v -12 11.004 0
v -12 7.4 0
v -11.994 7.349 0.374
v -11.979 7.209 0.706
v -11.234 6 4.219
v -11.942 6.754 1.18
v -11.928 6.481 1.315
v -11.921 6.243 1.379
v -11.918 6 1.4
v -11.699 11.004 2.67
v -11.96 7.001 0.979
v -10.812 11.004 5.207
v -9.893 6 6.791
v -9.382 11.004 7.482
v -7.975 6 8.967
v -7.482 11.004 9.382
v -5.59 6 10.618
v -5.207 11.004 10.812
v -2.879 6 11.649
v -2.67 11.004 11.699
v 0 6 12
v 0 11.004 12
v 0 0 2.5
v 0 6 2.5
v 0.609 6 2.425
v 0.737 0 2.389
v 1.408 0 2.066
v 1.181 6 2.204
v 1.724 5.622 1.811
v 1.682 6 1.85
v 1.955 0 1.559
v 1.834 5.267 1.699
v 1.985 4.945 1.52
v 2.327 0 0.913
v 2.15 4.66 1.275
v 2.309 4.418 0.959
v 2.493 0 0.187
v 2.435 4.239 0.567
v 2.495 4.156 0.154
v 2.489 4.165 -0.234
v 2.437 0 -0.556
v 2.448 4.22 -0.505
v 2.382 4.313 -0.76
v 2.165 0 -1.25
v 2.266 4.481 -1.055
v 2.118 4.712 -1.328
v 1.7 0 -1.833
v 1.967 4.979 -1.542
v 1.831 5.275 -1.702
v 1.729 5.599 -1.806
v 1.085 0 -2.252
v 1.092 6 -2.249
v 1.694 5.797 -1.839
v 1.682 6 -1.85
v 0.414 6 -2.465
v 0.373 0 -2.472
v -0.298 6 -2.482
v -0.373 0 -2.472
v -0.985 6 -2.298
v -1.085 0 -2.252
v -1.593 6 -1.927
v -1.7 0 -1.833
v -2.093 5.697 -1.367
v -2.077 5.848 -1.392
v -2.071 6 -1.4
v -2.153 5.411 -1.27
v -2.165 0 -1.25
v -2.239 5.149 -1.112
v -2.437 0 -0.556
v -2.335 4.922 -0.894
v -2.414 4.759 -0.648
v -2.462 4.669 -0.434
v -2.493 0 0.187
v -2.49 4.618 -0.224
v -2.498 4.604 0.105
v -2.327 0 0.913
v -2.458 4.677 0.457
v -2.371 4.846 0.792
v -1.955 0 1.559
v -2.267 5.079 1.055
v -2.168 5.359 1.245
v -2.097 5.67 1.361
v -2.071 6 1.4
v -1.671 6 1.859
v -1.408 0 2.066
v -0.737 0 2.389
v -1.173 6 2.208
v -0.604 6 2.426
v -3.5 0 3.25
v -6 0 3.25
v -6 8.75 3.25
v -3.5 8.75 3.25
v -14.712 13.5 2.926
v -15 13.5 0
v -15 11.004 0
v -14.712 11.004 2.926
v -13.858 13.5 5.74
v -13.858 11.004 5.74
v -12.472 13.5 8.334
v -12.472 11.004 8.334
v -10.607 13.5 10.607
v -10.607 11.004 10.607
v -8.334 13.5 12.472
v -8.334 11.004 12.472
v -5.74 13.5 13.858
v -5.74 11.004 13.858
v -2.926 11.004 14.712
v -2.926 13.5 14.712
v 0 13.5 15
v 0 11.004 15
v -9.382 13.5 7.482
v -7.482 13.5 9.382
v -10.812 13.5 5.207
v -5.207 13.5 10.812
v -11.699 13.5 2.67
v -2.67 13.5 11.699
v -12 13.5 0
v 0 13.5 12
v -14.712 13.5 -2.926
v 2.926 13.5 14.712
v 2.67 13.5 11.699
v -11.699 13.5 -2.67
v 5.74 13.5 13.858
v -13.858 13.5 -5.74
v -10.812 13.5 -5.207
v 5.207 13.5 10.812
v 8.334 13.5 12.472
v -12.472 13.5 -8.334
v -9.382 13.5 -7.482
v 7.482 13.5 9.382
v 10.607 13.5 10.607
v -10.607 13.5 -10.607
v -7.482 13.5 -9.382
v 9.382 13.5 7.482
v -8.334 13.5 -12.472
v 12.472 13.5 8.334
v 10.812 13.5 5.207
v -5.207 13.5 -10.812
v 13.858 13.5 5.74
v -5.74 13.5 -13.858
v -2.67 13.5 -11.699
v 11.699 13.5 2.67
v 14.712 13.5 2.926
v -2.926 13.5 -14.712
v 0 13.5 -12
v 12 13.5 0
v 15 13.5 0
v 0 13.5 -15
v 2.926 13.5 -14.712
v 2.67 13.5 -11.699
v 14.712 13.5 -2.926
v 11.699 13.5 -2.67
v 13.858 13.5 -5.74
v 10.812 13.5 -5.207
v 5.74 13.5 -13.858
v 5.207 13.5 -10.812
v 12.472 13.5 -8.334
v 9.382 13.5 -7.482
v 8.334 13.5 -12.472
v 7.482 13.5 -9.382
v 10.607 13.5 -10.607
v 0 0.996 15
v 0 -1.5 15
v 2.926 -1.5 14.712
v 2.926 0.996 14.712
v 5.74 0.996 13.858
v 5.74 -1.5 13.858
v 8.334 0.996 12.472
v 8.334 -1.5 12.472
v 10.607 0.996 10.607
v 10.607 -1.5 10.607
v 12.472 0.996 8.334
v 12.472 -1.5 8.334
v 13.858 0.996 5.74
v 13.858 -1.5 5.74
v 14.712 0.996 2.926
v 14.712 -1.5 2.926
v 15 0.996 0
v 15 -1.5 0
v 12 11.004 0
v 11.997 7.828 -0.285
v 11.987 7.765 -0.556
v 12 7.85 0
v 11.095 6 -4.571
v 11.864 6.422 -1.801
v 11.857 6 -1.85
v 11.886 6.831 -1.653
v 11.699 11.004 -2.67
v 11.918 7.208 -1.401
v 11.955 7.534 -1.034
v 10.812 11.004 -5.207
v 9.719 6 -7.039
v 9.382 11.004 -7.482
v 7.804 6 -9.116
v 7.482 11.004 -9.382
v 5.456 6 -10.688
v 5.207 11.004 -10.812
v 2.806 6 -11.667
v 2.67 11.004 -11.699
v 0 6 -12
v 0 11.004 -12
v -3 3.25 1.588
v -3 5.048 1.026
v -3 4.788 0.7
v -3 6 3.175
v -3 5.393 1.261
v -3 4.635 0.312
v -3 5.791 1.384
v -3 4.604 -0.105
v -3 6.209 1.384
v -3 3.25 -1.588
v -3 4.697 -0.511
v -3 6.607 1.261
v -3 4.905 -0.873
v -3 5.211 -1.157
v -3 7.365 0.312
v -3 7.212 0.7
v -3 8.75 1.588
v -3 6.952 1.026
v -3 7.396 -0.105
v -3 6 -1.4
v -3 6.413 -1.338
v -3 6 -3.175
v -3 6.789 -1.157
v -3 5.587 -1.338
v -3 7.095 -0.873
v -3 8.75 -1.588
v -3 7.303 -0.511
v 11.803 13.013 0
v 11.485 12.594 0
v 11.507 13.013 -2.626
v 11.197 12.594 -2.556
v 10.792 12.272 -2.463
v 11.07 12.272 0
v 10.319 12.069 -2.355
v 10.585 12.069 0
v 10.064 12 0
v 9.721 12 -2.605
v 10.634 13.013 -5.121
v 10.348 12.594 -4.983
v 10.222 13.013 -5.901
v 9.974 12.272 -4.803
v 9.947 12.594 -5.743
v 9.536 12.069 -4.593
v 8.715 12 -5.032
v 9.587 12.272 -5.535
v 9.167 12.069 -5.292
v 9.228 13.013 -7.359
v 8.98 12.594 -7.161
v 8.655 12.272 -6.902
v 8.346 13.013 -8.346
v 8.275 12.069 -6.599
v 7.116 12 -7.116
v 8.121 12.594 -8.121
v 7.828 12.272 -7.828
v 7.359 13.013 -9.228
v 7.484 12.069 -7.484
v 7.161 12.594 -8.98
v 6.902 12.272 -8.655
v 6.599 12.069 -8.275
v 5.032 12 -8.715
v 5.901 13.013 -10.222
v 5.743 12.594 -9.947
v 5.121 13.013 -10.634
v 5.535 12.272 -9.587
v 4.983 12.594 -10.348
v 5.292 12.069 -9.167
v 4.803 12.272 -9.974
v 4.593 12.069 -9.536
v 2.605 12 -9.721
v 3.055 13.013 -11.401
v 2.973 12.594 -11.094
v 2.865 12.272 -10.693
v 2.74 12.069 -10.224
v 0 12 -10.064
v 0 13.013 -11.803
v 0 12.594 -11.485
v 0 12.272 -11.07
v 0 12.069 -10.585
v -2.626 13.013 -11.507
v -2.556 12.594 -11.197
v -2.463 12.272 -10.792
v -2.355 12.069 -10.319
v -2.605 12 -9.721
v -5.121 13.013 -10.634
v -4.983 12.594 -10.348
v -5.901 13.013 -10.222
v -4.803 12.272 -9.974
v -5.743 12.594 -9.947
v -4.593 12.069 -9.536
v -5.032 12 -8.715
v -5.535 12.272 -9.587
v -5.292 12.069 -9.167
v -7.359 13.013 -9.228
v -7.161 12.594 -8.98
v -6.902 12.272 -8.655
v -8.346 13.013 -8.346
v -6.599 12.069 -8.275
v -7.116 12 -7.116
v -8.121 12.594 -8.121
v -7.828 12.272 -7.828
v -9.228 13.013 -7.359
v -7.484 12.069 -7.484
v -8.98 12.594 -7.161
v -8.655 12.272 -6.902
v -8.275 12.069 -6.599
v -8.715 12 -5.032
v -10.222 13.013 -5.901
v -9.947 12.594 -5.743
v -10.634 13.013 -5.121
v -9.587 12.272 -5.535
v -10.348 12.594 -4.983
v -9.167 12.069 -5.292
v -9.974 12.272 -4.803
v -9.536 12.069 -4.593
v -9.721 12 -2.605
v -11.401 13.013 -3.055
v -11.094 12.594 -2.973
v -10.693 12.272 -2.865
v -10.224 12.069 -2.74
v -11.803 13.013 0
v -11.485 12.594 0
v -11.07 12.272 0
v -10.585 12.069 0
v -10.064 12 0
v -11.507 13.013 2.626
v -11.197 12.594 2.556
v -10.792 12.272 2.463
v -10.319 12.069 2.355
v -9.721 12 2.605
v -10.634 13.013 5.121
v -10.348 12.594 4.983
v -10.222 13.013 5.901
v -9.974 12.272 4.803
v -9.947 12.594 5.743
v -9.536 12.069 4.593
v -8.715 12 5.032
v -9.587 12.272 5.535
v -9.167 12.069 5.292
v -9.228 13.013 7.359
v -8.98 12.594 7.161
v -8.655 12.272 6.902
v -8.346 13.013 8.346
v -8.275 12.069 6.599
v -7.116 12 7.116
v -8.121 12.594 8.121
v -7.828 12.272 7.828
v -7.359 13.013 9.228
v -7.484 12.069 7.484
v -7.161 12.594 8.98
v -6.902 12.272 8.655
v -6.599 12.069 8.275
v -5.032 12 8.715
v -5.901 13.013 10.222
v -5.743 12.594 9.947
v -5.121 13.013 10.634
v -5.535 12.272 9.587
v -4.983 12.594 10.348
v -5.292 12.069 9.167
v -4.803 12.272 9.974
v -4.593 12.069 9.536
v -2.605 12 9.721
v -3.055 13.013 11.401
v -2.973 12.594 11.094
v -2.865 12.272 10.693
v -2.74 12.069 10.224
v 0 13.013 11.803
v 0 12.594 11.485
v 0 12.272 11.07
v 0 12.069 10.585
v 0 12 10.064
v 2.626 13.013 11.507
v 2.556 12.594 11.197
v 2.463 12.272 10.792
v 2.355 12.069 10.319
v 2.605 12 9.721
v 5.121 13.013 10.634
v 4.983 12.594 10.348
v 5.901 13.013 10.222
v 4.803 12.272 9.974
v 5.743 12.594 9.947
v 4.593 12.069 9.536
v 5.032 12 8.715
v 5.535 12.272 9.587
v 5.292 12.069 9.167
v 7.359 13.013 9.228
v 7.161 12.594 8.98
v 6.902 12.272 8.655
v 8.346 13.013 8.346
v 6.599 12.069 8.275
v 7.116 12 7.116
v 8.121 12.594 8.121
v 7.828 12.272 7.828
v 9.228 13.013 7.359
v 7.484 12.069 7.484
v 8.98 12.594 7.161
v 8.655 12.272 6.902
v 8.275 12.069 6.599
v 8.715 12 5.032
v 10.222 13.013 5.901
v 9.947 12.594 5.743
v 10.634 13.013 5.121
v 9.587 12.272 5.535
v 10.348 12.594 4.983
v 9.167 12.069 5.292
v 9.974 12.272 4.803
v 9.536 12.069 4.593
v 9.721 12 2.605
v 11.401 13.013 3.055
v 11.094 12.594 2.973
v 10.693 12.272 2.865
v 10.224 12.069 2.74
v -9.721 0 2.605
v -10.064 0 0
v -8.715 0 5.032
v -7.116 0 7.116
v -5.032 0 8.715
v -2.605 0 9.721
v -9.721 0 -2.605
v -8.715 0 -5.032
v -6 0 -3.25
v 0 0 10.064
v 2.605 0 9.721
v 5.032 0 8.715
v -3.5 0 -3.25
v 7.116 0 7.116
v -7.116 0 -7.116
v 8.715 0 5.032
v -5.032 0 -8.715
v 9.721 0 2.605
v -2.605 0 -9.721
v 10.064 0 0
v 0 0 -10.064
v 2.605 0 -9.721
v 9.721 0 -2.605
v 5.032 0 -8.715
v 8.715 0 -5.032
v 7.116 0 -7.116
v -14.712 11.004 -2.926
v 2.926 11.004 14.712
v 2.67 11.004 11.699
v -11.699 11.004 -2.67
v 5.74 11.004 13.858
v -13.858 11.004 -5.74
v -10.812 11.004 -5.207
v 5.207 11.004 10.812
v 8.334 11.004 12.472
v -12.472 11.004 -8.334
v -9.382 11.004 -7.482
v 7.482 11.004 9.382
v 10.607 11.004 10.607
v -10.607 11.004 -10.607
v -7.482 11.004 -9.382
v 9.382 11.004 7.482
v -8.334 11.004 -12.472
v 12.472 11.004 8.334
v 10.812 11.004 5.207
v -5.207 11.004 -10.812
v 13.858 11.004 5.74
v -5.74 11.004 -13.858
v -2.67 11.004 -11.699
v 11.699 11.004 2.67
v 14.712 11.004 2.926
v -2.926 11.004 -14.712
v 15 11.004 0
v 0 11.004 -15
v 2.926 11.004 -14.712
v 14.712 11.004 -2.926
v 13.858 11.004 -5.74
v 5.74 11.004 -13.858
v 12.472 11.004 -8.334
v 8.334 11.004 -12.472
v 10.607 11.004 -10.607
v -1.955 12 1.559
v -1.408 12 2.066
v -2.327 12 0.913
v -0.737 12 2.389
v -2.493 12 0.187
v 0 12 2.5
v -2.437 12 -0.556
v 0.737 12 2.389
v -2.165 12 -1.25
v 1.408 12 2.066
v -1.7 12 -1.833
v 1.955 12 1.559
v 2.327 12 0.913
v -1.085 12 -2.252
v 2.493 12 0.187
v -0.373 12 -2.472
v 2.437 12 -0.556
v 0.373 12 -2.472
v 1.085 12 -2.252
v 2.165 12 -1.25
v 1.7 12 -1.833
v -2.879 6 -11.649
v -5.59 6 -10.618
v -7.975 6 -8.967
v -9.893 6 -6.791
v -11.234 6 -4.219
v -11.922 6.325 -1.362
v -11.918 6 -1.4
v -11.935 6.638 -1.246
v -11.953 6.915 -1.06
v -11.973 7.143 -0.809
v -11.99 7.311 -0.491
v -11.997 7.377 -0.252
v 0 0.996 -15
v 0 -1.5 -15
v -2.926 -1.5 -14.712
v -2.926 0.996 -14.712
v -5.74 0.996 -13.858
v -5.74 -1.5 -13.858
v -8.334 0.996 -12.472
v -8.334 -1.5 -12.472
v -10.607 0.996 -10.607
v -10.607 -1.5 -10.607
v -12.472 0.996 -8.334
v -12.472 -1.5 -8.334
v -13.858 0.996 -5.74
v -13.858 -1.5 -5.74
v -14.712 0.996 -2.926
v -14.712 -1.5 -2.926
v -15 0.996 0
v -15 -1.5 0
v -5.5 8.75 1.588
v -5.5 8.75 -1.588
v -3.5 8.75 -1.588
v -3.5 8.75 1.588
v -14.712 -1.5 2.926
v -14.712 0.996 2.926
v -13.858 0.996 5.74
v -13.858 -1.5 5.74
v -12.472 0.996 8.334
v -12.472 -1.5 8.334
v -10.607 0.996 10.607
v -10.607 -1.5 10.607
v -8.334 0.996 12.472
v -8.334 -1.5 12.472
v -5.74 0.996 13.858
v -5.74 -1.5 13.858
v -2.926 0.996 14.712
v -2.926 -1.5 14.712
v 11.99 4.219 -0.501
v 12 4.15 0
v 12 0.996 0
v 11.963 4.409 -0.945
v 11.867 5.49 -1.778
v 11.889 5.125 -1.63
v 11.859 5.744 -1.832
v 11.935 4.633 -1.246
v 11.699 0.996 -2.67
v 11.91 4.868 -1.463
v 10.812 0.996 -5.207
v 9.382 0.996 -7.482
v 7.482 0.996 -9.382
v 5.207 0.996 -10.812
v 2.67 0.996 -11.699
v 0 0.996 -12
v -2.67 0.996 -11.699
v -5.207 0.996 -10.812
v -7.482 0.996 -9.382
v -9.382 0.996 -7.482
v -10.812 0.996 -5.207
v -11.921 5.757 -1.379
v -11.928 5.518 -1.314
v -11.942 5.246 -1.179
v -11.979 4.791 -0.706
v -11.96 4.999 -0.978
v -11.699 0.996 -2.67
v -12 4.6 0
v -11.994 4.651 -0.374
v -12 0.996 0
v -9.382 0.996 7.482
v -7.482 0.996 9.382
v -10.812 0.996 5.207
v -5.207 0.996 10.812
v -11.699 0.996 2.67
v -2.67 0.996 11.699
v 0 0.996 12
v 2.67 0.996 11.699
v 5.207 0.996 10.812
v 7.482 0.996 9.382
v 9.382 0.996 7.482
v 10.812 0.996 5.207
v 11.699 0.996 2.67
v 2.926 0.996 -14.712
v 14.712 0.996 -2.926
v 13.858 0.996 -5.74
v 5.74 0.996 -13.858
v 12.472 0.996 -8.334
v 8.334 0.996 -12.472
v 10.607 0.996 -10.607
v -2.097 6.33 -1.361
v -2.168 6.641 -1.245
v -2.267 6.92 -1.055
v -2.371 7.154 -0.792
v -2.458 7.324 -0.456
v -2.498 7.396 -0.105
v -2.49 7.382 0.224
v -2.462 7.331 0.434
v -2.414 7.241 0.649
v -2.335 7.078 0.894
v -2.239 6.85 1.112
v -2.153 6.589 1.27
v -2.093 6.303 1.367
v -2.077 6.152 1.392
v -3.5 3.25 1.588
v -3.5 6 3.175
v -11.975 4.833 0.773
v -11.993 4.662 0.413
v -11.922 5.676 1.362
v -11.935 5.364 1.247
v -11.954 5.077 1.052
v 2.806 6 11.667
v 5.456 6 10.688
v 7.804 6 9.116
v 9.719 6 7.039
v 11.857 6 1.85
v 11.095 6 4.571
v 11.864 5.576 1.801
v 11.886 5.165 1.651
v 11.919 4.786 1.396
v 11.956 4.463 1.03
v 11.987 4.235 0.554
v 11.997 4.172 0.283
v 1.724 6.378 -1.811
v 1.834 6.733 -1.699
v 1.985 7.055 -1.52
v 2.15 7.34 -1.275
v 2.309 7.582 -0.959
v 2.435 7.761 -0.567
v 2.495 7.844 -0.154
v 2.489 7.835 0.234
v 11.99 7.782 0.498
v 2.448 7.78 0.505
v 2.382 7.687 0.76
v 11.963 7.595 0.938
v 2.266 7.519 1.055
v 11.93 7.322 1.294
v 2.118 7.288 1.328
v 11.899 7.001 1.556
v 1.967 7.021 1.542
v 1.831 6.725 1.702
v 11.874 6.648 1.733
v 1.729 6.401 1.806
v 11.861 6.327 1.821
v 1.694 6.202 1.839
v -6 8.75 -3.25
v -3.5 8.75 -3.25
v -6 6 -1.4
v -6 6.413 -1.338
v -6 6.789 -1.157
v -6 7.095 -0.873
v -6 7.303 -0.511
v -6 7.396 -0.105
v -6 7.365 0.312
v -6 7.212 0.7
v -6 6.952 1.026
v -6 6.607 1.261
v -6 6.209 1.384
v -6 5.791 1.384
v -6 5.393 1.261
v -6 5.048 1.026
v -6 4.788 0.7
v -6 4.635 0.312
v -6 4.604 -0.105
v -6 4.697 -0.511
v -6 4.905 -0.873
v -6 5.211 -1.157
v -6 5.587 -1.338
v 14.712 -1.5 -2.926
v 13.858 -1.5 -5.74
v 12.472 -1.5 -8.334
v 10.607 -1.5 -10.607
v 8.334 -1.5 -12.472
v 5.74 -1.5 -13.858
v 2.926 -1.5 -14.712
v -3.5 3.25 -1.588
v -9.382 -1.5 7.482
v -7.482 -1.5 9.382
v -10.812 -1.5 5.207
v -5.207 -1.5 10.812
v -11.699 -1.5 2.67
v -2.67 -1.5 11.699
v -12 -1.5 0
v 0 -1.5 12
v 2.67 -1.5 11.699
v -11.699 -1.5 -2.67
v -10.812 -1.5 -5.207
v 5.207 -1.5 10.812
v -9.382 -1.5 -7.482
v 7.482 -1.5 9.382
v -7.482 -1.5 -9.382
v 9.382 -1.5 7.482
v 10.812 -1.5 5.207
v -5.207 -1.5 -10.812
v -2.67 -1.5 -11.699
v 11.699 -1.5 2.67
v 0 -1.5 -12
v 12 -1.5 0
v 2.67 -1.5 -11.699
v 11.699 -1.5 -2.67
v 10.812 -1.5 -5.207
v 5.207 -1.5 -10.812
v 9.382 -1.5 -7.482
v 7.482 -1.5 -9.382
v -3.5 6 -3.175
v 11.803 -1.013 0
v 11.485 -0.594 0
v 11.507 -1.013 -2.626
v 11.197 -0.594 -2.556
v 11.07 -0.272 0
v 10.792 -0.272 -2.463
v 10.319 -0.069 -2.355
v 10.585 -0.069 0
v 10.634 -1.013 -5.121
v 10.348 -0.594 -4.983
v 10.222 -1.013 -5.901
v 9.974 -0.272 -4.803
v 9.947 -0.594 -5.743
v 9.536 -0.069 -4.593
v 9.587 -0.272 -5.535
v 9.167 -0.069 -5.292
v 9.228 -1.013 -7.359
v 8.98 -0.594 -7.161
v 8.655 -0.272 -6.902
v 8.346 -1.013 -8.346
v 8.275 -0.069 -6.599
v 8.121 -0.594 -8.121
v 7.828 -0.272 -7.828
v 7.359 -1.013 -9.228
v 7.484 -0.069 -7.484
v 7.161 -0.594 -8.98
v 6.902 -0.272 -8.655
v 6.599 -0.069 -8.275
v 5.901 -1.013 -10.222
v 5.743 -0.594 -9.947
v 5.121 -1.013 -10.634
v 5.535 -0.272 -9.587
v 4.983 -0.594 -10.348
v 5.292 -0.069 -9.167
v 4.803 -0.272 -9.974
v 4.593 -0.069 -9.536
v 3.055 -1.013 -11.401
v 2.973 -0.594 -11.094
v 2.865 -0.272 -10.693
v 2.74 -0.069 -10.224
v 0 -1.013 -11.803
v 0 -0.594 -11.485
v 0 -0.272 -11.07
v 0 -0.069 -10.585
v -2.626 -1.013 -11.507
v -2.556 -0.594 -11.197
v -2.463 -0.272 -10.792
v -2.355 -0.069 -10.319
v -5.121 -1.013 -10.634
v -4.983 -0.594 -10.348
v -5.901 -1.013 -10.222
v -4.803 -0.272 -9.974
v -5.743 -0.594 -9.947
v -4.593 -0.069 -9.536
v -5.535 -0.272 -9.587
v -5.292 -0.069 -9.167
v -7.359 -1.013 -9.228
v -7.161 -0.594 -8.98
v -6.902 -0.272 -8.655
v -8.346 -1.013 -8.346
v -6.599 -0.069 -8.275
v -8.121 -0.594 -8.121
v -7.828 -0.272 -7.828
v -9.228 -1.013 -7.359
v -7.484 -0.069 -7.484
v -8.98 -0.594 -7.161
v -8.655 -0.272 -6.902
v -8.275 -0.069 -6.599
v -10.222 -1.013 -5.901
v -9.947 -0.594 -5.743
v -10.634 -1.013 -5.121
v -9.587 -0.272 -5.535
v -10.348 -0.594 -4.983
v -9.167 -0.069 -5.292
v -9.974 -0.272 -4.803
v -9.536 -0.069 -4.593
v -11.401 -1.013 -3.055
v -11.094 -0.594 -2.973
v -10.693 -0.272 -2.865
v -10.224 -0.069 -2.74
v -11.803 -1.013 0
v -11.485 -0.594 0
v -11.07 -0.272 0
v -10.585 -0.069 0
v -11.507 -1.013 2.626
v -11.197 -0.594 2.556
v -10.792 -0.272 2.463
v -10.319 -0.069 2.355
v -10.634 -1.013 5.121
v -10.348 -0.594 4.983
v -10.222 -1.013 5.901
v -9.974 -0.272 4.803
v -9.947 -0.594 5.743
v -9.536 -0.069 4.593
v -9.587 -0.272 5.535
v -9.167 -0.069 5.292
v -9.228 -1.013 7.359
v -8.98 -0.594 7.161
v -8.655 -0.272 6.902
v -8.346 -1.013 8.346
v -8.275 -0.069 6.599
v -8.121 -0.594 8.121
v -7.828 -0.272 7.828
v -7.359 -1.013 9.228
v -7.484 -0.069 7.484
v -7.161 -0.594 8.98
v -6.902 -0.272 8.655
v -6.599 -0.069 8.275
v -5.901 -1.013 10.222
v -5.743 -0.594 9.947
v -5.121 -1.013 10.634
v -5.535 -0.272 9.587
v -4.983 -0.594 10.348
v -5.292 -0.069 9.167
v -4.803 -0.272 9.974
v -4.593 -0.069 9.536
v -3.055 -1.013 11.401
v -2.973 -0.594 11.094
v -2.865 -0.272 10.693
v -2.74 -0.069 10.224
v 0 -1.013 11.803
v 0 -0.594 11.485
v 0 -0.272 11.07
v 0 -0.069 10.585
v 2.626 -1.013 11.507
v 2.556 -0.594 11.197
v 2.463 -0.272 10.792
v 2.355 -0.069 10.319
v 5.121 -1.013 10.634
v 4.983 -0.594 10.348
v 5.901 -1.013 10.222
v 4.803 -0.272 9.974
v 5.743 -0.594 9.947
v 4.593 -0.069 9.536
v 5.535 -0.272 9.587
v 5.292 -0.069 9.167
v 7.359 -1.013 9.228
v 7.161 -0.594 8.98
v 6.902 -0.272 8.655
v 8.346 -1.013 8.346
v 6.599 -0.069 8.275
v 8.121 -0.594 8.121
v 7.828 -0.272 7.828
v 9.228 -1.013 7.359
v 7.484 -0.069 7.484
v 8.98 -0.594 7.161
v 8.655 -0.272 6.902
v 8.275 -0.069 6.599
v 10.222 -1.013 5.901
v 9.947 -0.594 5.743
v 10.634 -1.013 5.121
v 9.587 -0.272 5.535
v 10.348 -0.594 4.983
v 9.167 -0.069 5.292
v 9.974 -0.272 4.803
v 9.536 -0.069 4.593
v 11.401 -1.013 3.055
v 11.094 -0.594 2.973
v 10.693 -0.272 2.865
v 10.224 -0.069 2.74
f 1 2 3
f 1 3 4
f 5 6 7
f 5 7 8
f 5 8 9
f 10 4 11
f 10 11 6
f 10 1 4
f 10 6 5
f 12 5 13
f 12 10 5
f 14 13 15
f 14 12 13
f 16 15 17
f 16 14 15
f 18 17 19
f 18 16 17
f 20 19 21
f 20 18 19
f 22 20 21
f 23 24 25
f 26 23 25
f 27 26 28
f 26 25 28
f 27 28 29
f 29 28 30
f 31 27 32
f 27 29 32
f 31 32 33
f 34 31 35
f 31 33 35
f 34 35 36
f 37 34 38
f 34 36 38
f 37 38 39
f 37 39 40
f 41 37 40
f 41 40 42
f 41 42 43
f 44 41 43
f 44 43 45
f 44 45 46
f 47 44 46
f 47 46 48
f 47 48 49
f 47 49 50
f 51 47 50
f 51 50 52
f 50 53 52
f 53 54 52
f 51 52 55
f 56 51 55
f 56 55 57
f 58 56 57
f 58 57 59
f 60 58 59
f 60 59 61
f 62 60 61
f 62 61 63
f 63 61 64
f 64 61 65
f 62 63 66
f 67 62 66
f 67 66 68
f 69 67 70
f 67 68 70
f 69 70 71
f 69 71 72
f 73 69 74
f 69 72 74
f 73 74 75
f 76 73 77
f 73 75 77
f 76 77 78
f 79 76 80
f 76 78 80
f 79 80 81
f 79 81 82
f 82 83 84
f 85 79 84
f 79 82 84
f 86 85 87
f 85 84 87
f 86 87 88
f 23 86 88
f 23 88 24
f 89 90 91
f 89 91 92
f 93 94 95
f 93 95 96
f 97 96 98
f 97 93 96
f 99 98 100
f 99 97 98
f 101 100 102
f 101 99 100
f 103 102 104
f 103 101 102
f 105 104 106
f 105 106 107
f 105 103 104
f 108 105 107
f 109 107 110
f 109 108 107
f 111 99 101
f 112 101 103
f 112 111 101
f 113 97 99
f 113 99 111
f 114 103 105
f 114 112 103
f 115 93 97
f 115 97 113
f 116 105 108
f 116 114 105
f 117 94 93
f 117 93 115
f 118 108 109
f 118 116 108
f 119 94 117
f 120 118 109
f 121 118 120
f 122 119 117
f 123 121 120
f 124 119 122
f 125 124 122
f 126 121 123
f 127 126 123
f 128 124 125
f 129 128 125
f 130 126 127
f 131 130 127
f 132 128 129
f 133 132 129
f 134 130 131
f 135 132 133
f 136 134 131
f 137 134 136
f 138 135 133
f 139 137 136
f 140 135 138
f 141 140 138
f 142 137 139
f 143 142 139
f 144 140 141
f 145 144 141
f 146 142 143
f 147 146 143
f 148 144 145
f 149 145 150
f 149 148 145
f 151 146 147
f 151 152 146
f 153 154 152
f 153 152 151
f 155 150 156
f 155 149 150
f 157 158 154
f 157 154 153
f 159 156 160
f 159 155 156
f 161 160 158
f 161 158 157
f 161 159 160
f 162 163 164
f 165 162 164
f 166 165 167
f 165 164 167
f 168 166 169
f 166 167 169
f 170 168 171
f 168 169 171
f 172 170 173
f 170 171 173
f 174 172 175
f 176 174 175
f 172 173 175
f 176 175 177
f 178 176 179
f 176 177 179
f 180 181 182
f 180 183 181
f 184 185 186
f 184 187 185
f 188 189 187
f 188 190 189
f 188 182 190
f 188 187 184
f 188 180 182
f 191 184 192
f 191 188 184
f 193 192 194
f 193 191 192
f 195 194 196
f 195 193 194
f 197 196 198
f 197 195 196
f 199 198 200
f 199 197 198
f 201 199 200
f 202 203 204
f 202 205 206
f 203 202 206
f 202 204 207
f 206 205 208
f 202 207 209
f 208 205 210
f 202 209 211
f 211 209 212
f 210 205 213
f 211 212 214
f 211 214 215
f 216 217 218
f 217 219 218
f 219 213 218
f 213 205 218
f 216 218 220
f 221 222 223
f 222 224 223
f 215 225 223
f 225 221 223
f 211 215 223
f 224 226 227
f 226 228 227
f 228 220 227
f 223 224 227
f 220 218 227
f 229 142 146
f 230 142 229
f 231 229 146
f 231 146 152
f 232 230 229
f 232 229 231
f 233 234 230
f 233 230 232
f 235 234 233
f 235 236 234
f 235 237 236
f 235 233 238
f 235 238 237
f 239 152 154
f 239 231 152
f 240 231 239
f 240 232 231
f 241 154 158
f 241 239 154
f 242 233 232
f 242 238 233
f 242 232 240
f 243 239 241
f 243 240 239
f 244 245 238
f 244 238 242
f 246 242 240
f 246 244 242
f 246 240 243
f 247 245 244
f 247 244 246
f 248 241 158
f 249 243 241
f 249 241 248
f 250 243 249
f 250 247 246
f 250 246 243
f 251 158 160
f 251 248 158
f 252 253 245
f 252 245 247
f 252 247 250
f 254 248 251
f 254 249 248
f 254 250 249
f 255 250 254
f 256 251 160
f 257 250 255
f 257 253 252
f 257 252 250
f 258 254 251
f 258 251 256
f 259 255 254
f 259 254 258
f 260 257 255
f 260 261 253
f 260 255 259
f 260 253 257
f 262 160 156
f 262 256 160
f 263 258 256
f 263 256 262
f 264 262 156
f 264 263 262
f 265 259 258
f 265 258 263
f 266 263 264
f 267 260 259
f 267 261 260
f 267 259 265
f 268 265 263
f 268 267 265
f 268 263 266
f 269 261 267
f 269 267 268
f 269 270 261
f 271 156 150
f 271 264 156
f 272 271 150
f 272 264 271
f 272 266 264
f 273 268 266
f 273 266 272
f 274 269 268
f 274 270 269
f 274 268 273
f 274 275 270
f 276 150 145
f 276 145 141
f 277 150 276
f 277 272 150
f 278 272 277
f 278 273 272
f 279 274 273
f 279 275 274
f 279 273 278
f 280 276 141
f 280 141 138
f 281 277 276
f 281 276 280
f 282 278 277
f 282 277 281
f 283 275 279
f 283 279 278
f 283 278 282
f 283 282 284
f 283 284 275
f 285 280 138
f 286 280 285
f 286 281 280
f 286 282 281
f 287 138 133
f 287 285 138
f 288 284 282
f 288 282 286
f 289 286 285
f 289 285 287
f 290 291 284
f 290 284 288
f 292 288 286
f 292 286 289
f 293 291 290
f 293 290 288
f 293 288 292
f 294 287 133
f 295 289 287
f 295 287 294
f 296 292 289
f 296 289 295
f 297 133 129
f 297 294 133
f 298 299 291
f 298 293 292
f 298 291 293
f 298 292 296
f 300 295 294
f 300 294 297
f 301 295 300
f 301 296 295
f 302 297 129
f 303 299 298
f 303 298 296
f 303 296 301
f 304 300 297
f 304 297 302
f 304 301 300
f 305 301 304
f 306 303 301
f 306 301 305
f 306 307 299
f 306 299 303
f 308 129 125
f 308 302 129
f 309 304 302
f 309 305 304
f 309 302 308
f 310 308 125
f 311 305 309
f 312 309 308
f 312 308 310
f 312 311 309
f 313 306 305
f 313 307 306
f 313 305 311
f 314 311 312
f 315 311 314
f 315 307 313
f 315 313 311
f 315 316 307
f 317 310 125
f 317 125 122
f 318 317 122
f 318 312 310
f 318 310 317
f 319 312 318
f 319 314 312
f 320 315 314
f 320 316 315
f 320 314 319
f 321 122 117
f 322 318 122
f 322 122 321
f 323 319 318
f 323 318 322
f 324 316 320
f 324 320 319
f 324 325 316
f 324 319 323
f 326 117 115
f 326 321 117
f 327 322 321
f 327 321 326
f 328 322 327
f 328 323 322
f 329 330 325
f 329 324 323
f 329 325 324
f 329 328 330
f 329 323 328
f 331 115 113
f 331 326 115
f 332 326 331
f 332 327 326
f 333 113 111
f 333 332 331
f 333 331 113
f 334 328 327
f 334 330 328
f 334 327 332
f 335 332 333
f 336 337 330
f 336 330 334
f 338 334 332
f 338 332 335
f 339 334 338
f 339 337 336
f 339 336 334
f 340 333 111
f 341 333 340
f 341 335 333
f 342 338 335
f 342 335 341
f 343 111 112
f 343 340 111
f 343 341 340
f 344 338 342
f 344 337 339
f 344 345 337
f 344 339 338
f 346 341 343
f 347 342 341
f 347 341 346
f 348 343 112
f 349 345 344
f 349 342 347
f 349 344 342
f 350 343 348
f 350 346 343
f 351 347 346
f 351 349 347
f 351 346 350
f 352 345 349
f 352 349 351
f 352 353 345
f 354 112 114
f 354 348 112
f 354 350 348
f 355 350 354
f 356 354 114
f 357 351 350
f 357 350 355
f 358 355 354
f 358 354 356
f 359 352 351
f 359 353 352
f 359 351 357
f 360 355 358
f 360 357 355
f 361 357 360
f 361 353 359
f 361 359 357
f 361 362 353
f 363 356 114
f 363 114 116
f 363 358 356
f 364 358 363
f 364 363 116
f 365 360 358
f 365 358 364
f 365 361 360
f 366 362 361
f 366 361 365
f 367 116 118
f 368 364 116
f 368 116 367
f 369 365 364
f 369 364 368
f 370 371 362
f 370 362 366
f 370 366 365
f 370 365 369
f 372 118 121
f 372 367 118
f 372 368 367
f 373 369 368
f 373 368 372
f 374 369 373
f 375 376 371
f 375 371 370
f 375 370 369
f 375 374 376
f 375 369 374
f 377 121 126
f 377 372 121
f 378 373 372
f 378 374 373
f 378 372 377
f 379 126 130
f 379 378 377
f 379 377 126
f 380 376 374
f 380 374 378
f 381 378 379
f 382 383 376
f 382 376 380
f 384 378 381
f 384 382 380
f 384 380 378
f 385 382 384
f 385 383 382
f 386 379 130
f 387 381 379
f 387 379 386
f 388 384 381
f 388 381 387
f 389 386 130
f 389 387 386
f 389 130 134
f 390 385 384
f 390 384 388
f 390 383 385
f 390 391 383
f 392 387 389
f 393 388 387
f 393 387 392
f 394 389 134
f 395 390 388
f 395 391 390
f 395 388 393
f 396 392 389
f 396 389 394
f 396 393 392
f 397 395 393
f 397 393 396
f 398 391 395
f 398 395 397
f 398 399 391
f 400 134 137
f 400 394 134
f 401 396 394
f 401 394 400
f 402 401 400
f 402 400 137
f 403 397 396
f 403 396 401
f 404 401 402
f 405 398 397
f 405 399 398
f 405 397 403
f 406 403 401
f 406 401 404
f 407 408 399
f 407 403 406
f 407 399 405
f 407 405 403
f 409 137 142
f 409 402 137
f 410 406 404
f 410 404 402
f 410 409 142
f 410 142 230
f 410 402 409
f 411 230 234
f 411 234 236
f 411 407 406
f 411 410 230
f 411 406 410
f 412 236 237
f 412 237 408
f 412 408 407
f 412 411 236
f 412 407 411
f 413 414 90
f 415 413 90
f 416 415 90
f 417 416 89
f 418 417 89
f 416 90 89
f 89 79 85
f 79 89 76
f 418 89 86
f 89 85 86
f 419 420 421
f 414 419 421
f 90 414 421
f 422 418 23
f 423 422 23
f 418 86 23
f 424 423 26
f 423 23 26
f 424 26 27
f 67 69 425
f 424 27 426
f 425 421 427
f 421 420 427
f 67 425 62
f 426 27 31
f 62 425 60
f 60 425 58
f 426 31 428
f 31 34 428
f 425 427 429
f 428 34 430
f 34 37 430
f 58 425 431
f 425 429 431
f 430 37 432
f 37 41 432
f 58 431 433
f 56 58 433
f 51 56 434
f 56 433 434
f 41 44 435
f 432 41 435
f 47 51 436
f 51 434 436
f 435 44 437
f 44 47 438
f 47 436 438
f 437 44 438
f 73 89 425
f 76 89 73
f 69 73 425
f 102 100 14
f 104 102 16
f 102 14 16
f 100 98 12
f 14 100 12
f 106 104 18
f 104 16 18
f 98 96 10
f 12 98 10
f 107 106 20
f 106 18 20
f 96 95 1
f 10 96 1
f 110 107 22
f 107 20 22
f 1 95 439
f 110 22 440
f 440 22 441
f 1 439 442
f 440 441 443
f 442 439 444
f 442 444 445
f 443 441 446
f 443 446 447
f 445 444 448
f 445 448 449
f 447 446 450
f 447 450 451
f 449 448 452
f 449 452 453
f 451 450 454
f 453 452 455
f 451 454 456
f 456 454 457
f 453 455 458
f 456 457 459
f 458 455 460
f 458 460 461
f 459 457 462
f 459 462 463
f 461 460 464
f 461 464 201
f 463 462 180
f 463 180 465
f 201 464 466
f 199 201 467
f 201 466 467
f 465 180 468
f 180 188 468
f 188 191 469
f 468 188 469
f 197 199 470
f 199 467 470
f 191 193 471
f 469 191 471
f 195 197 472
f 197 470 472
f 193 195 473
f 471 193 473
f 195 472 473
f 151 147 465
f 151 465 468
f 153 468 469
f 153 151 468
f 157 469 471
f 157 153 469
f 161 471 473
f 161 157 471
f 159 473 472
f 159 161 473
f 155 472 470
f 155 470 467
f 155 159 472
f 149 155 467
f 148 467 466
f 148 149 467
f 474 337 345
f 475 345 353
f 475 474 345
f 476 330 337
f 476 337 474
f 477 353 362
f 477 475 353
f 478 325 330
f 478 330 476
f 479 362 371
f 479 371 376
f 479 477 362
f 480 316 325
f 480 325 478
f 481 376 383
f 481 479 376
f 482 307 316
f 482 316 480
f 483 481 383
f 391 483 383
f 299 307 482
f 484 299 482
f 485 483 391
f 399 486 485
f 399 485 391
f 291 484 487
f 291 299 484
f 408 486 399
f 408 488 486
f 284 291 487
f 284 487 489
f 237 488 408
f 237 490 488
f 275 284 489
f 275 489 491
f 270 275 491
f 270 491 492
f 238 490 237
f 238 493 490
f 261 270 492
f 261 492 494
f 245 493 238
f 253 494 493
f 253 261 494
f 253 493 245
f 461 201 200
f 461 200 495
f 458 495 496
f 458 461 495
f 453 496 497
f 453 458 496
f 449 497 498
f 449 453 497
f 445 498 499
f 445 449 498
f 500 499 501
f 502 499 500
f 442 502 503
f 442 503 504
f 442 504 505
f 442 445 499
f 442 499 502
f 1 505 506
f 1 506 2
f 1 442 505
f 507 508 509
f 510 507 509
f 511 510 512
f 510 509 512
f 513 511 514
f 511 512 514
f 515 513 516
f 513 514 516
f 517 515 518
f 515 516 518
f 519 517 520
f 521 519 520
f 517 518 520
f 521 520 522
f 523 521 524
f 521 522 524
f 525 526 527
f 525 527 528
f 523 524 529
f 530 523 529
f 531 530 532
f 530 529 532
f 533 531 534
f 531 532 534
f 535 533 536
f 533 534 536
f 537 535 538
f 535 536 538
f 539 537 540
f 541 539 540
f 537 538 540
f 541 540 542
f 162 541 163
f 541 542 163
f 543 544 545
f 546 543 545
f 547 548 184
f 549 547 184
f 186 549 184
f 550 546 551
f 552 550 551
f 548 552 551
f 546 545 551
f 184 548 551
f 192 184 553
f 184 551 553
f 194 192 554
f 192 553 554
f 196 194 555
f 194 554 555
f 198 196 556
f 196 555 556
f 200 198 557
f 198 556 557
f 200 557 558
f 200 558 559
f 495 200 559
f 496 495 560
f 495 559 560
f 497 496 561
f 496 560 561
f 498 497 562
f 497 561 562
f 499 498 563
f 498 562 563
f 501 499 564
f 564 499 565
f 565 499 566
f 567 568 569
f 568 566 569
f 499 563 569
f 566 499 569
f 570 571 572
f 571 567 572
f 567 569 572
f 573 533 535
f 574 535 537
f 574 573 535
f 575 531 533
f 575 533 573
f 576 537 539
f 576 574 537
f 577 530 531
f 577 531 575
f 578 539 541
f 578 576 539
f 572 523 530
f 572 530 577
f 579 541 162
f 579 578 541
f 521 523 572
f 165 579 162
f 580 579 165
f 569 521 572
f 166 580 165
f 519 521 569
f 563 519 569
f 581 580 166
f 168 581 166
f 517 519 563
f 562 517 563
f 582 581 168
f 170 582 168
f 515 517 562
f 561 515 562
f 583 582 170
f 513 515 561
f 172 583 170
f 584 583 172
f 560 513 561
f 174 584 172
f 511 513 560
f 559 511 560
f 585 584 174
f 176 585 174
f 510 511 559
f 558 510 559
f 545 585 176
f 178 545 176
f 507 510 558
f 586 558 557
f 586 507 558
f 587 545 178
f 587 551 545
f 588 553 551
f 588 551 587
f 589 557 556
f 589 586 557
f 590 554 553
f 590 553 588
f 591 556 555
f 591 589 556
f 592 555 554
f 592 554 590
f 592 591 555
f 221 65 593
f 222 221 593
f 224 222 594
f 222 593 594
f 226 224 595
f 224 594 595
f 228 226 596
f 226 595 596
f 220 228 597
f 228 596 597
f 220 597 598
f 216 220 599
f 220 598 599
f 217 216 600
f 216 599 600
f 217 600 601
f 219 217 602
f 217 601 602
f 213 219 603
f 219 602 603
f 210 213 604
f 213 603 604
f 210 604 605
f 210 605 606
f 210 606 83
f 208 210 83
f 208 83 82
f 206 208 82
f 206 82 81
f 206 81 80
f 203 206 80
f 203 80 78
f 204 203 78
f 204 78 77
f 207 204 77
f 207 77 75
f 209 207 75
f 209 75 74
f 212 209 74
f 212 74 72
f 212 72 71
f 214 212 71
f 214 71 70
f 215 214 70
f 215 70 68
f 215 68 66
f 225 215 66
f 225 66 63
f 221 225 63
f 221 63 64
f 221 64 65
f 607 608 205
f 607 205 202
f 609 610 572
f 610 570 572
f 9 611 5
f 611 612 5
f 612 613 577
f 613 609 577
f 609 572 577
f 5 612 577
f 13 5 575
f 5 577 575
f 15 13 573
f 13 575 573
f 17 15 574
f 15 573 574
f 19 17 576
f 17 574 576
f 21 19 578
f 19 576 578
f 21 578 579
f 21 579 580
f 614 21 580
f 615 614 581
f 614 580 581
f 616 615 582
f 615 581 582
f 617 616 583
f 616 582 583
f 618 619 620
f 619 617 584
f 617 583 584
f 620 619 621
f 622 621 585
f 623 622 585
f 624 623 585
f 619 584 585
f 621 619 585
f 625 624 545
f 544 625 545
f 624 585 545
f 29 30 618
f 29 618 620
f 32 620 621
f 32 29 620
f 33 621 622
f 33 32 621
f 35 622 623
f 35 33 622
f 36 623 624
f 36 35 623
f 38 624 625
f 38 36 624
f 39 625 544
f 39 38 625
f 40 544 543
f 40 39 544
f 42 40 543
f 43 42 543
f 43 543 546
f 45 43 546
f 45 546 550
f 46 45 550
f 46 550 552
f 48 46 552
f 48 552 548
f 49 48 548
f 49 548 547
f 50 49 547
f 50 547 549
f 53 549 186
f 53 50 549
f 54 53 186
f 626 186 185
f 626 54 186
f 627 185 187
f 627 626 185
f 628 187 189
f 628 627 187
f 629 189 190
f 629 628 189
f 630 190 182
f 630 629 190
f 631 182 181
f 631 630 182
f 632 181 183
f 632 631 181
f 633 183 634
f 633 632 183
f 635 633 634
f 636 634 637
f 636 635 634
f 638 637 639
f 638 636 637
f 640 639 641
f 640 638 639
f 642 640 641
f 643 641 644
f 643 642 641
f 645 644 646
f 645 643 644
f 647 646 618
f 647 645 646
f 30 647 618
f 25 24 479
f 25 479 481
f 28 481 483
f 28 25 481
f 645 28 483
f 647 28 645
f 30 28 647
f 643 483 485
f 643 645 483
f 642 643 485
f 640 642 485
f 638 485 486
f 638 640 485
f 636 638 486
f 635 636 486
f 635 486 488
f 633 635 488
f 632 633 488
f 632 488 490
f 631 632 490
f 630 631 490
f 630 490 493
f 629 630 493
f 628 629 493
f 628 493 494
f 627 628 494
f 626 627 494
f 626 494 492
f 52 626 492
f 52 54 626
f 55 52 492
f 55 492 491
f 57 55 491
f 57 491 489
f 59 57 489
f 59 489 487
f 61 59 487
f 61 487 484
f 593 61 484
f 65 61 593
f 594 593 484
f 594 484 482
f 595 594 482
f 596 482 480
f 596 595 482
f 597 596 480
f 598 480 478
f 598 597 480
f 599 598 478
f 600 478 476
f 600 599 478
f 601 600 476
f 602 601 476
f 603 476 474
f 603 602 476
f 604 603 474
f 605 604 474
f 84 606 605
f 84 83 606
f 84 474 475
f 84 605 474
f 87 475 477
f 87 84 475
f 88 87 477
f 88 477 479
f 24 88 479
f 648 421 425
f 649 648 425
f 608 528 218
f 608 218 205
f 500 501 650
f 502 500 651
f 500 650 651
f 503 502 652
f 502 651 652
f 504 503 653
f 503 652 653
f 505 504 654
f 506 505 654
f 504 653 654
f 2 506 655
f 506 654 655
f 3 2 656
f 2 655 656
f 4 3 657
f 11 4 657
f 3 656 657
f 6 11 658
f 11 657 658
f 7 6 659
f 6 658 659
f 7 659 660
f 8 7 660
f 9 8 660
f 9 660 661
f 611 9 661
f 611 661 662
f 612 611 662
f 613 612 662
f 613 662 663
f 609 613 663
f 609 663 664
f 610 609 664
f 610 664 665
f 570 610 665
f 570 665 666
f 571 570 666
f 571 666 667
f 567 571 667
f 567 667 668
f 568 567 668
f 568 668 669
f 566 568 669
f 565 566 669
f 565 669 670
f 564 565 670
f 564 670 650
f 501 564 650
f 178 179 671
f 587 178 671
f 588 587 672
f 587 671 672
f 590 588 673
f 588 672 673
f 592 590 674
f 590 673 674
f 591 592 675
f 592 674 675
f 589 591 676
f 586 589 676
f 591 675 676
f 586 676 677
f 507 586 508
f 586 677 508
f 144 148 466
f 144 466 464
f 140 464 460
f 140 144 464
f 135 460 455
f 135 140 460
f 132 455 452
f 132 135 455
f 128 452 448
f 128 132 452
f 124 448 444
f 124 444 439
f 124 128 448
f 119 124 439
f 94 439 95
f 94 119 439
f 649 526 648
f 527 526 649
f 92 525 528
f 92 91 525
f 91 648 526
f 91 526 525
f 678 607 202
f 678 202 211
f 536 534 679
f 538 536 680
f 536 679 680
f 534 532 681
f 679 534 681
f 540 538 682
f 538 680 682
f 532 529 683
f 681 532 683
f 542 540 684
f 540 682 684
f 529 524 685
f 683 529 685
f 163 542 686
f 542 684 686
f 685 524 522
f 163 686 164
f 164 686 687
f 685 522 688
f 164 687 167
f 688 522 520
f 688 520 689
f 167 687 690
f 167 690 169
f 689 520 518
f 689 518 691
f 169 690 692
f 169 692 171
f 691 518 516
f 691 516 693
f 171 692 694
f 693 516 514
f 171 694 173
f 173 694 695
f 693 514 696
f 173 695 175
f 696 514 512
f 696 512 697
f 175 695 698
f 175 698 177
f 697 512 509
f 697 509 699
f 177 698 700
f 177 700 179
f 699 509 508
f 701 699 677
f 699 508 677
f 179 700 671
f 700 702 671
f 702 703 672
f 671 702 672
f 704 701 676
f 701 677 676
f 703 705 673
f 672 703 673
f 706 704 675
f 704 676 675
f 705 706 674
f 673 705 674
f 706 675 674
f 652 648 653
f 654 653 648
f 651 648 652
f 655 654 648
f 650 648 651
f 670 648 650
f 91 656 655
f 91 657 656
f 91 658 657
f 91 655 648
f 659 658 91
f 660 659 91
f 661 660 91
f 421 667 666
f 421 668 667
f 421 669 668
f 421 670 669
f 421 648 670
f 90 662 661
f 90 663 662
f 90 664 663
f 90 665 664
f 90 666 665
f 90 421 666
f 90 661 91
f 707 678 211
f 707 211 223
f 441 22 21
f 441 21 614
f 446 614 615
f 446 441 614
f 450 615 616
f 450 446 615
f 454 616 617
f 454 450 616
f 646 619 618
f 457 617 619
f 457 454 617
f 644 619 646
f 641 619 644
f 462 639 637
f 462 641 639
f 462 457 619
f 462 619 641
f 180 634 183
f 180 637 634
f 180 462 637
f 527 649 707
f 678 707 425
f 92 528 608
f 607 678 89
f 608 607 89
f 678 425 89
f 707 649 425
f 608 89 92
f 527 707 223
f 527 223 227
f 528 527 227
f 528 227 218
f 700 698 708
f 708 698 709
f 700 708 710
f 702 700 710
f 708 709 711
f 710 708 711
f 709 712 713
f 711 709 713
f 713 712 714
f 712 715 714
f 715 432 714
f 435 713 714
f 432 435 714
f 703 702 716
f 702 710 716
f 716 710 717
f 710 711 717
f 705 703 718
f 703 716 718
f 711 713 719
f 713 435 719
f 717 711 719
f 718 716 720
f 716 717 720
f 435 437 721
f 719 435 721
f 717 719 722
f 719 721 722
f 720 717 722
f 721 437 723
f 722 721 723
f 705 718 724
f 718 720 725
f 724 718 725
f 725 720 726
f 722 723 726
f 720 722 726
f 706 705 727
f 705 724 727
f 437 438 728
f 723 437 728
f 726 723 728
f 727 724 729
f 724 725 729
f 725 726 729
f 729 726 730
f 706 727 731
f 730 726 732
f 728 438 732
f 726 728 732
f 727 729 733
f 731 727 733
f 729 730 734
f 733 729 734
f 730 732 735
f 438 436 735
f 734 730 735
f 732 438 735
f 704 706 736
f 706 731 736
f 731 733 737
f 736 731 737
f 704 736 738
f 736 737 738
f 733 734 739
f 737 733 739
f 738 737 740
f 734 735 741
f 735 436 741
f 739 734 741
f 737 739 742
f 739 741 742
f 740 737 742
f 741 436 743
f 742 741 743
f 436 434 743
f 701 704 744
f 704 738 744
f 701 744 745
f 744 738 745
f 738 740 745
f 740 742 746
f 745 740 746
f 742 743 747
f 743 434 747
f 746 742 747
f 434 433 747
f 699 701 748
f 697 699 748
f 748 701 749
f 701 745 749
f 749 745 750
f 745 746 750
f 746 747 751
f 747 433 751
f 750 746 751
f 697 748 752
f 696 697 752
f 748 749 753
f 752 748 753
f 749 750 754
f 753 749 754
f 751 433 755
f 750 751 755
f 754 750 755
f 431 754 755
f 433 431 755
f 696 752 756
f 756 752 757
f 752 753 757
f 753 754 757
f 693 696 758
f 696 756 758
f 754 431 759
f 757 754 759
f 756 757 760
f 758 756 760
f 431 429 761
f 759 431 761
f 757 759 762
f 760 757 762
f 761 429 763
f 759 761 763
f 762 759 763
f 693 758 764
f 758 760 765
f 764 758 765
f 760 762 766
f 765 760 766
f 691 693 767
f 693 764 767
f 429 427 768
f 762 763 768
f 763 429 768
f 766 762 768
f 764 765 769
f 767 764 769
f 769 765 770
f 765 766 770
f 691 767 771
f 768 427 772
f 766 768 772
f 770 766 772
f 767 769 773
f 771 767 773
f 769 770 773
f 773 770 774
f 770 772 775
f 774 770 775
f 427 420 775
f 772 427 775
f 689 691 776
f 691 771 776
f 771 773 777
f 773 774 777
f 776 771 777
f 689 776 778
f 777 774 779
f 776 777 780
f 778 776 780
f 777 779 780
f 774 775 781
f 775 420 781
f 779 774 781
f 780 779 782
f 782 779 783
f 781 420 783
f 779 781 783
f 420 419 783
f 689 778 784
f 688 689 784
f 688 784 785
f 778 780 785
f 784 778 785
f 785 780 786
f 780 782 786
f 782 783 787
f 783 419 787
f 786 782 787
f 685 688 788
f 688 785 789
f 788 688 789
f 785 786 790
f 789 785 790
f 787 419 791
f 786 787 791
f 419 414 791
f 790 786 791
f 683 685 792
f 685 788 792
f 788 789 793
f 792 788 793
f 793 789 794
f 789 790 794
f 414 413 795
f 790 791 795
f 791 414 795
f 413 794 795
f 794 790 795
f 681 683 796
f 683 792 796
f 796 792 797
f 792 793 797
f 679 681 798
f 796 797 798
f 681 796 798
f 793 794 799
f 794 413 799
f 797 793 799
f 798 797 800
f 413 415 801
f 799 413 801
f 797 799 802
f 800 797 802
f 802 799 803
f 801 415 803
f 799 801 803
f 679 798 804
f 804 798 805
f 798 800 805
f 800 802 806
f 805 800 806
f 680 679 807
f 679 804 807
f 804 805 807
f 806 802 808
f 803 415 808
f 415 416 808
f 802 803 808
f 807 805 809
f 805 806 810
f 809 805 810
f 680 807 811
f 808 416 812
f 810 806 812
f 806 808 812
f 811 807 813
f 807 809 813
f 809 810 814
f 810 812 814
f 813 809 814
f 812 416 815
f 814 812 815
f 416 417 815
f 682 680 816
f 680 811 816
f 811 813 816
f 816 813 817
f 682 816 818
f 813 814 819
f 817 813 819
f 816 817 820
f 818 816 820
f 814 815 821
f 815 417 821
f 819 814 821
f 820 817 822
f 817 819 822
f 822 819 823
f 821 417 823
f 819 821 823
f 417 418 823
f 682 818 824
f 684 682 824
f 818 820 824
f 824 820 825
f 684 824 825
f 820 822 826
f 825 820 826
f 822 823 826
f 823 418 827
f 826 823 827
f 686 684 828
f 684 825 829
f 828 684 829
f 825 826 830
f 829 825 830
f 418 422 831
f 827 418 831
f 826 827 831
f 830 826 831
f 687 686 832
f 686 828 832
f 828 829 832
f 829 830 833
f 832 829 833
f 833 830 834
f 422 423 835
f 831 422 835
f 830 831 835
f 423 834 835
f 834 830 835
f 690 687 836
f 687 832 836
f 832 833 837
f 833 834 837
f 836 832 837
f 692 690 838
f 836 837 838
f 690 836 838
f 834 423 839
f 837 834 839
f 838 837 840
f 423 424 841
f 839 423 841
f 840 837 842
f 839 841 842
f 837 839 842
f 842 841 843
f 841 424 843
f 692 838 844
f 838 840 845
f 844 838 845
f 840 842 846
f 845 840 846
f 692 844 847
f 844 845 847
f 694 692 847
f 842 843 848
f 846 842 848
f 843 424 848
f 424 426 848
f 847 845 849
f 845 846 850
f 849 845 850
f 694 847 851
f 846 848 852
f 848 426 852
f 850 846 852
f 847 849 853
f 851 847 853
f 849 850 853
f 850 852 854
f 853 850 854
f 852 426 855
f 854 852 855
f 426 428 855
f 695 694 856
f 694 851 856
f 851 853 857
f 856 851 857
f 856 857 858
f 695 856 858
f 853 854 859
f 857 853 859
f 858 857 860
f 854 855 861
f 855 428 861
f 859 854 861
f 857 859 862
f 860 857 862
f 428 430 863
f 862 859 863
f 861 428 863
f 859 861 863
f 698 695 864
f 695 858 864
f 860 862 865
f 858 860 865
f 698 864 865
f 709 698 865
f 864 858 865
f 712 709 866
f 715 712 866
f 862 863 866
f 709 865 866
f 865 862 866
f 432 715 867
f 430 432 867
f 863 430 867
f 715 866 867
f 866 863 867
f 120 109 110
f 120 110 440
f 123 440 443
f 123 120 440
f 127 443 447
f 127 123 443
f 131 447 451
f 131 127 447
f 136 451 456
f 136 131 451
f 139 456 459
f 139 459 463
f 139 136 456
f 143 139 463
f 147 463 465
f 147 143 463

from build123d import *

# Parameters (mm, degrees)
BOSS_EXTRUDE6_DEPTH      = 6
BOSS_EXTRUDE7_DEPTH      = 0.995824486
BOSS_EXTRUDE7_DEPTH_BACK = 1.5
FILLET17_R               = 2
SKETCH4_R                = 2.5
CUT_EXTRUDE2_DEPTH       = 11.5
SKETCH11_R               = 1.4
CUT_EXTRUDE3_DEPTH       = 15
CUT_EXTRUDE10_DEPTH      = 0.5
CUT_EXTRUDE10_DEPTH_BACK = 2
SKETCH14_W               = 2.5
SKETCH14_H               = 6.5
CUT_EXTRUDE15_DEPTH      = 8.75
SKETCH16_R               = 1.85
CUT_EXTRUDE16_DEPTH      = 15


with BuildPart() as part:
    # Sketch1 → Boss-Extrude6 (new body)
    with BuildSketch(Plane(origin=(0, 0, 0), x_dir=(1, 0, 0), z_dir=(0, 1, 0))):
        with BuildLine():
            ThreePointArc((12, 0), (8.485281374, 8.485281374), (0, 12))
            ThreePointArc((0, 12), (-8.485281374, 8.485281374), (-12, 0))
            ThreePointArc((-12, 0), (-8.485281374, -8.485281374), (0, -12))
            ThreePointArc((0, -12), (8.485281374, -8.485281374), (12, 0))
        make_face()
    extrude(amount=BOSS_EXTRUDE6_DEPTH)

    # Sketch1<11> → Boss-Extrude7 (add, two sides: drawn at the far end of the back side and taken through both)
    with BuildSketch(Plane(origin=(0, 0, 0), x_dir=(1, 0, 0), z_dir=(0, 1, 0)).offset(-BOSS_EXTRUDE7_DEPTH_BACK)):
        with BuildLine():
            ThreePointArc((15, 0), (10.606601718, 10.606601718), (0, 15))
            ThreePointArc((0, 15), (-10.606601718, 10.606601718), (-15, 0))
            ThreePointArc((-15, 0), (-10.606601718, -10.606601718), (0, -15))
            ThreePointArc((0, -15), (10.606601718, -10.606601718), (15, 0))
        make_face()
        with BuildLine():
            ThreePointArc((12, 0), (8.485281374, 8.485281374), (0, 12))
            ThreePointArc((0, 12), (-8.485281374, 8.485281374), (-12, 0))
            ThreePointArc((-12, 0), (-8.485281374, -8.485281374), (0, -12))
            ThreePointArc((0, -12), (8.485281374, -8.485281374), (12, 0))
        make_face(mode=Mode.SUBTRACT)
    extrude(amount=BOSS_EXTRUDE7_DEPTH + BOSS_EXTRUDE7_DEPTH_BACK)


with BuildPart() as boss_extrude7_kept_piece:
    # of the separate pieces the step leaves, the one the design keeps (boss_extrude7_pieces_kept)
    add(part.part.solids().sort_by_distance((12, 6, 0))[0])

    # Fillet17
    # the kernel refuses this fillet: 2 mm, written as the material it adds along each edge
    with BuildSketch(Plane(origin=(0, 0, 0), x_dir=(1, 0, 0), z_dir=(0, 0, 1))) as fillet17_piece_1:
        with BuildLine():
            CenterArc((10.063508327, -2), FILLET17_R, 14.477512186, 75.522487814)
            Line((10.063508327, 0), (10.063508327, 0.04))
            Line((10.063508327, 0.04), (12, 0.04))
            Line((12, 0.04), (12.04, 0))
            ThreePointArc((12.04, 0), (12.04, -0.75), (12.038729833, -1.49))
            Line((12.038729833, -1.49), (12, -1.5))
        make_face()
    revolve(axis=Axis((0, 0, 0), (0, 1, 0)))

    # Sketch4 → Cut-Extrude2 (cut)
    with BuildSketch(Plane(origin=(0, 6, 0), x_dir=(1, 0, 0), z_dir=(0, 1, 0))):
        with Locations(Location((0, 0, 0), (0, 0, 270))):
            Circle(SKETCH4_R)
    extrude(amount=-CUT_EXTRUDE2_DEPTH, mode=Mode.SUBTRACT)

    # Mirror6: Boss-Extrude7 kept piece across plane


with BuildPart() as boss_extrude7_kept_piece_1:
    add(boss_extrude7_kept_piece.part)
    add(boss_extrude7_kept_piece.part.mirror(Plane.ZX.offset(6)))

    # Sketch11 → Cut-Extrude3 (cut)
    with BuildSketch(Plane(origin=(0, 0, 0), x_dir=(0, 0, -1), z_dir=(1, 0, 0))):
        with Locations((0, 6)):
            Circle(SKETCH11_R)
    extrude(amount=-CUT_EXTRUDE3_DEPTH, mode=Mode.SUBTRACT)

    # Sketch12 → Cut-Extrude10 (cut, two sides: drawn at the far end of the back side and taken through both)
    with BuildSketch(Plane(origin=(-3.5, 0, 0), x_dir=(0, 0, -1), z_dir=(1, 0, 0)).offset(-CUT_EXTRUDE10_DEPTH_BACK)):
        Polygon((3.175426481, 6), (1.58771324, 8.75), (-1.58771324, 8.75), (-3.175426481, 6), (-1.58771324, 3.25), (1.58771324, 3.25), align=None)
    extrude(amount=CUT_EXTRUDE10_DEPTH + CUT_EXTRUDE10_DEPTH_BACK, mode=Mode.SUBTRACT)

    # Sketch14 → Cut-Extrude15 (cut)
    with BuildSketch(Plane.XZ):
        with Locations((-4.75, 0)):
            Rectangle(SKETCH14_W, SKETCH14_H)
    extrude(amount=-CUT_EXTRUDE15_DEPTH, mode=Mode.SUBTRACT)

    # Sketch16 → Cut-Extrude16 (cut)
    with BuildSketch(Plane(origin=(0, 0, 0), x_dir=(0, 0, -1), z_dir=(1, 0, 0))):
        with Locations(Location((0, 6, 0), (0, 0, 180))):
            Circle(SKETCH16_R)
    extrude(amount=CUT_EXTRUDE16_DEPTH, mode=Mode.SUBTRACT)


solid = boss_extrude7_kept_piece_1.part
